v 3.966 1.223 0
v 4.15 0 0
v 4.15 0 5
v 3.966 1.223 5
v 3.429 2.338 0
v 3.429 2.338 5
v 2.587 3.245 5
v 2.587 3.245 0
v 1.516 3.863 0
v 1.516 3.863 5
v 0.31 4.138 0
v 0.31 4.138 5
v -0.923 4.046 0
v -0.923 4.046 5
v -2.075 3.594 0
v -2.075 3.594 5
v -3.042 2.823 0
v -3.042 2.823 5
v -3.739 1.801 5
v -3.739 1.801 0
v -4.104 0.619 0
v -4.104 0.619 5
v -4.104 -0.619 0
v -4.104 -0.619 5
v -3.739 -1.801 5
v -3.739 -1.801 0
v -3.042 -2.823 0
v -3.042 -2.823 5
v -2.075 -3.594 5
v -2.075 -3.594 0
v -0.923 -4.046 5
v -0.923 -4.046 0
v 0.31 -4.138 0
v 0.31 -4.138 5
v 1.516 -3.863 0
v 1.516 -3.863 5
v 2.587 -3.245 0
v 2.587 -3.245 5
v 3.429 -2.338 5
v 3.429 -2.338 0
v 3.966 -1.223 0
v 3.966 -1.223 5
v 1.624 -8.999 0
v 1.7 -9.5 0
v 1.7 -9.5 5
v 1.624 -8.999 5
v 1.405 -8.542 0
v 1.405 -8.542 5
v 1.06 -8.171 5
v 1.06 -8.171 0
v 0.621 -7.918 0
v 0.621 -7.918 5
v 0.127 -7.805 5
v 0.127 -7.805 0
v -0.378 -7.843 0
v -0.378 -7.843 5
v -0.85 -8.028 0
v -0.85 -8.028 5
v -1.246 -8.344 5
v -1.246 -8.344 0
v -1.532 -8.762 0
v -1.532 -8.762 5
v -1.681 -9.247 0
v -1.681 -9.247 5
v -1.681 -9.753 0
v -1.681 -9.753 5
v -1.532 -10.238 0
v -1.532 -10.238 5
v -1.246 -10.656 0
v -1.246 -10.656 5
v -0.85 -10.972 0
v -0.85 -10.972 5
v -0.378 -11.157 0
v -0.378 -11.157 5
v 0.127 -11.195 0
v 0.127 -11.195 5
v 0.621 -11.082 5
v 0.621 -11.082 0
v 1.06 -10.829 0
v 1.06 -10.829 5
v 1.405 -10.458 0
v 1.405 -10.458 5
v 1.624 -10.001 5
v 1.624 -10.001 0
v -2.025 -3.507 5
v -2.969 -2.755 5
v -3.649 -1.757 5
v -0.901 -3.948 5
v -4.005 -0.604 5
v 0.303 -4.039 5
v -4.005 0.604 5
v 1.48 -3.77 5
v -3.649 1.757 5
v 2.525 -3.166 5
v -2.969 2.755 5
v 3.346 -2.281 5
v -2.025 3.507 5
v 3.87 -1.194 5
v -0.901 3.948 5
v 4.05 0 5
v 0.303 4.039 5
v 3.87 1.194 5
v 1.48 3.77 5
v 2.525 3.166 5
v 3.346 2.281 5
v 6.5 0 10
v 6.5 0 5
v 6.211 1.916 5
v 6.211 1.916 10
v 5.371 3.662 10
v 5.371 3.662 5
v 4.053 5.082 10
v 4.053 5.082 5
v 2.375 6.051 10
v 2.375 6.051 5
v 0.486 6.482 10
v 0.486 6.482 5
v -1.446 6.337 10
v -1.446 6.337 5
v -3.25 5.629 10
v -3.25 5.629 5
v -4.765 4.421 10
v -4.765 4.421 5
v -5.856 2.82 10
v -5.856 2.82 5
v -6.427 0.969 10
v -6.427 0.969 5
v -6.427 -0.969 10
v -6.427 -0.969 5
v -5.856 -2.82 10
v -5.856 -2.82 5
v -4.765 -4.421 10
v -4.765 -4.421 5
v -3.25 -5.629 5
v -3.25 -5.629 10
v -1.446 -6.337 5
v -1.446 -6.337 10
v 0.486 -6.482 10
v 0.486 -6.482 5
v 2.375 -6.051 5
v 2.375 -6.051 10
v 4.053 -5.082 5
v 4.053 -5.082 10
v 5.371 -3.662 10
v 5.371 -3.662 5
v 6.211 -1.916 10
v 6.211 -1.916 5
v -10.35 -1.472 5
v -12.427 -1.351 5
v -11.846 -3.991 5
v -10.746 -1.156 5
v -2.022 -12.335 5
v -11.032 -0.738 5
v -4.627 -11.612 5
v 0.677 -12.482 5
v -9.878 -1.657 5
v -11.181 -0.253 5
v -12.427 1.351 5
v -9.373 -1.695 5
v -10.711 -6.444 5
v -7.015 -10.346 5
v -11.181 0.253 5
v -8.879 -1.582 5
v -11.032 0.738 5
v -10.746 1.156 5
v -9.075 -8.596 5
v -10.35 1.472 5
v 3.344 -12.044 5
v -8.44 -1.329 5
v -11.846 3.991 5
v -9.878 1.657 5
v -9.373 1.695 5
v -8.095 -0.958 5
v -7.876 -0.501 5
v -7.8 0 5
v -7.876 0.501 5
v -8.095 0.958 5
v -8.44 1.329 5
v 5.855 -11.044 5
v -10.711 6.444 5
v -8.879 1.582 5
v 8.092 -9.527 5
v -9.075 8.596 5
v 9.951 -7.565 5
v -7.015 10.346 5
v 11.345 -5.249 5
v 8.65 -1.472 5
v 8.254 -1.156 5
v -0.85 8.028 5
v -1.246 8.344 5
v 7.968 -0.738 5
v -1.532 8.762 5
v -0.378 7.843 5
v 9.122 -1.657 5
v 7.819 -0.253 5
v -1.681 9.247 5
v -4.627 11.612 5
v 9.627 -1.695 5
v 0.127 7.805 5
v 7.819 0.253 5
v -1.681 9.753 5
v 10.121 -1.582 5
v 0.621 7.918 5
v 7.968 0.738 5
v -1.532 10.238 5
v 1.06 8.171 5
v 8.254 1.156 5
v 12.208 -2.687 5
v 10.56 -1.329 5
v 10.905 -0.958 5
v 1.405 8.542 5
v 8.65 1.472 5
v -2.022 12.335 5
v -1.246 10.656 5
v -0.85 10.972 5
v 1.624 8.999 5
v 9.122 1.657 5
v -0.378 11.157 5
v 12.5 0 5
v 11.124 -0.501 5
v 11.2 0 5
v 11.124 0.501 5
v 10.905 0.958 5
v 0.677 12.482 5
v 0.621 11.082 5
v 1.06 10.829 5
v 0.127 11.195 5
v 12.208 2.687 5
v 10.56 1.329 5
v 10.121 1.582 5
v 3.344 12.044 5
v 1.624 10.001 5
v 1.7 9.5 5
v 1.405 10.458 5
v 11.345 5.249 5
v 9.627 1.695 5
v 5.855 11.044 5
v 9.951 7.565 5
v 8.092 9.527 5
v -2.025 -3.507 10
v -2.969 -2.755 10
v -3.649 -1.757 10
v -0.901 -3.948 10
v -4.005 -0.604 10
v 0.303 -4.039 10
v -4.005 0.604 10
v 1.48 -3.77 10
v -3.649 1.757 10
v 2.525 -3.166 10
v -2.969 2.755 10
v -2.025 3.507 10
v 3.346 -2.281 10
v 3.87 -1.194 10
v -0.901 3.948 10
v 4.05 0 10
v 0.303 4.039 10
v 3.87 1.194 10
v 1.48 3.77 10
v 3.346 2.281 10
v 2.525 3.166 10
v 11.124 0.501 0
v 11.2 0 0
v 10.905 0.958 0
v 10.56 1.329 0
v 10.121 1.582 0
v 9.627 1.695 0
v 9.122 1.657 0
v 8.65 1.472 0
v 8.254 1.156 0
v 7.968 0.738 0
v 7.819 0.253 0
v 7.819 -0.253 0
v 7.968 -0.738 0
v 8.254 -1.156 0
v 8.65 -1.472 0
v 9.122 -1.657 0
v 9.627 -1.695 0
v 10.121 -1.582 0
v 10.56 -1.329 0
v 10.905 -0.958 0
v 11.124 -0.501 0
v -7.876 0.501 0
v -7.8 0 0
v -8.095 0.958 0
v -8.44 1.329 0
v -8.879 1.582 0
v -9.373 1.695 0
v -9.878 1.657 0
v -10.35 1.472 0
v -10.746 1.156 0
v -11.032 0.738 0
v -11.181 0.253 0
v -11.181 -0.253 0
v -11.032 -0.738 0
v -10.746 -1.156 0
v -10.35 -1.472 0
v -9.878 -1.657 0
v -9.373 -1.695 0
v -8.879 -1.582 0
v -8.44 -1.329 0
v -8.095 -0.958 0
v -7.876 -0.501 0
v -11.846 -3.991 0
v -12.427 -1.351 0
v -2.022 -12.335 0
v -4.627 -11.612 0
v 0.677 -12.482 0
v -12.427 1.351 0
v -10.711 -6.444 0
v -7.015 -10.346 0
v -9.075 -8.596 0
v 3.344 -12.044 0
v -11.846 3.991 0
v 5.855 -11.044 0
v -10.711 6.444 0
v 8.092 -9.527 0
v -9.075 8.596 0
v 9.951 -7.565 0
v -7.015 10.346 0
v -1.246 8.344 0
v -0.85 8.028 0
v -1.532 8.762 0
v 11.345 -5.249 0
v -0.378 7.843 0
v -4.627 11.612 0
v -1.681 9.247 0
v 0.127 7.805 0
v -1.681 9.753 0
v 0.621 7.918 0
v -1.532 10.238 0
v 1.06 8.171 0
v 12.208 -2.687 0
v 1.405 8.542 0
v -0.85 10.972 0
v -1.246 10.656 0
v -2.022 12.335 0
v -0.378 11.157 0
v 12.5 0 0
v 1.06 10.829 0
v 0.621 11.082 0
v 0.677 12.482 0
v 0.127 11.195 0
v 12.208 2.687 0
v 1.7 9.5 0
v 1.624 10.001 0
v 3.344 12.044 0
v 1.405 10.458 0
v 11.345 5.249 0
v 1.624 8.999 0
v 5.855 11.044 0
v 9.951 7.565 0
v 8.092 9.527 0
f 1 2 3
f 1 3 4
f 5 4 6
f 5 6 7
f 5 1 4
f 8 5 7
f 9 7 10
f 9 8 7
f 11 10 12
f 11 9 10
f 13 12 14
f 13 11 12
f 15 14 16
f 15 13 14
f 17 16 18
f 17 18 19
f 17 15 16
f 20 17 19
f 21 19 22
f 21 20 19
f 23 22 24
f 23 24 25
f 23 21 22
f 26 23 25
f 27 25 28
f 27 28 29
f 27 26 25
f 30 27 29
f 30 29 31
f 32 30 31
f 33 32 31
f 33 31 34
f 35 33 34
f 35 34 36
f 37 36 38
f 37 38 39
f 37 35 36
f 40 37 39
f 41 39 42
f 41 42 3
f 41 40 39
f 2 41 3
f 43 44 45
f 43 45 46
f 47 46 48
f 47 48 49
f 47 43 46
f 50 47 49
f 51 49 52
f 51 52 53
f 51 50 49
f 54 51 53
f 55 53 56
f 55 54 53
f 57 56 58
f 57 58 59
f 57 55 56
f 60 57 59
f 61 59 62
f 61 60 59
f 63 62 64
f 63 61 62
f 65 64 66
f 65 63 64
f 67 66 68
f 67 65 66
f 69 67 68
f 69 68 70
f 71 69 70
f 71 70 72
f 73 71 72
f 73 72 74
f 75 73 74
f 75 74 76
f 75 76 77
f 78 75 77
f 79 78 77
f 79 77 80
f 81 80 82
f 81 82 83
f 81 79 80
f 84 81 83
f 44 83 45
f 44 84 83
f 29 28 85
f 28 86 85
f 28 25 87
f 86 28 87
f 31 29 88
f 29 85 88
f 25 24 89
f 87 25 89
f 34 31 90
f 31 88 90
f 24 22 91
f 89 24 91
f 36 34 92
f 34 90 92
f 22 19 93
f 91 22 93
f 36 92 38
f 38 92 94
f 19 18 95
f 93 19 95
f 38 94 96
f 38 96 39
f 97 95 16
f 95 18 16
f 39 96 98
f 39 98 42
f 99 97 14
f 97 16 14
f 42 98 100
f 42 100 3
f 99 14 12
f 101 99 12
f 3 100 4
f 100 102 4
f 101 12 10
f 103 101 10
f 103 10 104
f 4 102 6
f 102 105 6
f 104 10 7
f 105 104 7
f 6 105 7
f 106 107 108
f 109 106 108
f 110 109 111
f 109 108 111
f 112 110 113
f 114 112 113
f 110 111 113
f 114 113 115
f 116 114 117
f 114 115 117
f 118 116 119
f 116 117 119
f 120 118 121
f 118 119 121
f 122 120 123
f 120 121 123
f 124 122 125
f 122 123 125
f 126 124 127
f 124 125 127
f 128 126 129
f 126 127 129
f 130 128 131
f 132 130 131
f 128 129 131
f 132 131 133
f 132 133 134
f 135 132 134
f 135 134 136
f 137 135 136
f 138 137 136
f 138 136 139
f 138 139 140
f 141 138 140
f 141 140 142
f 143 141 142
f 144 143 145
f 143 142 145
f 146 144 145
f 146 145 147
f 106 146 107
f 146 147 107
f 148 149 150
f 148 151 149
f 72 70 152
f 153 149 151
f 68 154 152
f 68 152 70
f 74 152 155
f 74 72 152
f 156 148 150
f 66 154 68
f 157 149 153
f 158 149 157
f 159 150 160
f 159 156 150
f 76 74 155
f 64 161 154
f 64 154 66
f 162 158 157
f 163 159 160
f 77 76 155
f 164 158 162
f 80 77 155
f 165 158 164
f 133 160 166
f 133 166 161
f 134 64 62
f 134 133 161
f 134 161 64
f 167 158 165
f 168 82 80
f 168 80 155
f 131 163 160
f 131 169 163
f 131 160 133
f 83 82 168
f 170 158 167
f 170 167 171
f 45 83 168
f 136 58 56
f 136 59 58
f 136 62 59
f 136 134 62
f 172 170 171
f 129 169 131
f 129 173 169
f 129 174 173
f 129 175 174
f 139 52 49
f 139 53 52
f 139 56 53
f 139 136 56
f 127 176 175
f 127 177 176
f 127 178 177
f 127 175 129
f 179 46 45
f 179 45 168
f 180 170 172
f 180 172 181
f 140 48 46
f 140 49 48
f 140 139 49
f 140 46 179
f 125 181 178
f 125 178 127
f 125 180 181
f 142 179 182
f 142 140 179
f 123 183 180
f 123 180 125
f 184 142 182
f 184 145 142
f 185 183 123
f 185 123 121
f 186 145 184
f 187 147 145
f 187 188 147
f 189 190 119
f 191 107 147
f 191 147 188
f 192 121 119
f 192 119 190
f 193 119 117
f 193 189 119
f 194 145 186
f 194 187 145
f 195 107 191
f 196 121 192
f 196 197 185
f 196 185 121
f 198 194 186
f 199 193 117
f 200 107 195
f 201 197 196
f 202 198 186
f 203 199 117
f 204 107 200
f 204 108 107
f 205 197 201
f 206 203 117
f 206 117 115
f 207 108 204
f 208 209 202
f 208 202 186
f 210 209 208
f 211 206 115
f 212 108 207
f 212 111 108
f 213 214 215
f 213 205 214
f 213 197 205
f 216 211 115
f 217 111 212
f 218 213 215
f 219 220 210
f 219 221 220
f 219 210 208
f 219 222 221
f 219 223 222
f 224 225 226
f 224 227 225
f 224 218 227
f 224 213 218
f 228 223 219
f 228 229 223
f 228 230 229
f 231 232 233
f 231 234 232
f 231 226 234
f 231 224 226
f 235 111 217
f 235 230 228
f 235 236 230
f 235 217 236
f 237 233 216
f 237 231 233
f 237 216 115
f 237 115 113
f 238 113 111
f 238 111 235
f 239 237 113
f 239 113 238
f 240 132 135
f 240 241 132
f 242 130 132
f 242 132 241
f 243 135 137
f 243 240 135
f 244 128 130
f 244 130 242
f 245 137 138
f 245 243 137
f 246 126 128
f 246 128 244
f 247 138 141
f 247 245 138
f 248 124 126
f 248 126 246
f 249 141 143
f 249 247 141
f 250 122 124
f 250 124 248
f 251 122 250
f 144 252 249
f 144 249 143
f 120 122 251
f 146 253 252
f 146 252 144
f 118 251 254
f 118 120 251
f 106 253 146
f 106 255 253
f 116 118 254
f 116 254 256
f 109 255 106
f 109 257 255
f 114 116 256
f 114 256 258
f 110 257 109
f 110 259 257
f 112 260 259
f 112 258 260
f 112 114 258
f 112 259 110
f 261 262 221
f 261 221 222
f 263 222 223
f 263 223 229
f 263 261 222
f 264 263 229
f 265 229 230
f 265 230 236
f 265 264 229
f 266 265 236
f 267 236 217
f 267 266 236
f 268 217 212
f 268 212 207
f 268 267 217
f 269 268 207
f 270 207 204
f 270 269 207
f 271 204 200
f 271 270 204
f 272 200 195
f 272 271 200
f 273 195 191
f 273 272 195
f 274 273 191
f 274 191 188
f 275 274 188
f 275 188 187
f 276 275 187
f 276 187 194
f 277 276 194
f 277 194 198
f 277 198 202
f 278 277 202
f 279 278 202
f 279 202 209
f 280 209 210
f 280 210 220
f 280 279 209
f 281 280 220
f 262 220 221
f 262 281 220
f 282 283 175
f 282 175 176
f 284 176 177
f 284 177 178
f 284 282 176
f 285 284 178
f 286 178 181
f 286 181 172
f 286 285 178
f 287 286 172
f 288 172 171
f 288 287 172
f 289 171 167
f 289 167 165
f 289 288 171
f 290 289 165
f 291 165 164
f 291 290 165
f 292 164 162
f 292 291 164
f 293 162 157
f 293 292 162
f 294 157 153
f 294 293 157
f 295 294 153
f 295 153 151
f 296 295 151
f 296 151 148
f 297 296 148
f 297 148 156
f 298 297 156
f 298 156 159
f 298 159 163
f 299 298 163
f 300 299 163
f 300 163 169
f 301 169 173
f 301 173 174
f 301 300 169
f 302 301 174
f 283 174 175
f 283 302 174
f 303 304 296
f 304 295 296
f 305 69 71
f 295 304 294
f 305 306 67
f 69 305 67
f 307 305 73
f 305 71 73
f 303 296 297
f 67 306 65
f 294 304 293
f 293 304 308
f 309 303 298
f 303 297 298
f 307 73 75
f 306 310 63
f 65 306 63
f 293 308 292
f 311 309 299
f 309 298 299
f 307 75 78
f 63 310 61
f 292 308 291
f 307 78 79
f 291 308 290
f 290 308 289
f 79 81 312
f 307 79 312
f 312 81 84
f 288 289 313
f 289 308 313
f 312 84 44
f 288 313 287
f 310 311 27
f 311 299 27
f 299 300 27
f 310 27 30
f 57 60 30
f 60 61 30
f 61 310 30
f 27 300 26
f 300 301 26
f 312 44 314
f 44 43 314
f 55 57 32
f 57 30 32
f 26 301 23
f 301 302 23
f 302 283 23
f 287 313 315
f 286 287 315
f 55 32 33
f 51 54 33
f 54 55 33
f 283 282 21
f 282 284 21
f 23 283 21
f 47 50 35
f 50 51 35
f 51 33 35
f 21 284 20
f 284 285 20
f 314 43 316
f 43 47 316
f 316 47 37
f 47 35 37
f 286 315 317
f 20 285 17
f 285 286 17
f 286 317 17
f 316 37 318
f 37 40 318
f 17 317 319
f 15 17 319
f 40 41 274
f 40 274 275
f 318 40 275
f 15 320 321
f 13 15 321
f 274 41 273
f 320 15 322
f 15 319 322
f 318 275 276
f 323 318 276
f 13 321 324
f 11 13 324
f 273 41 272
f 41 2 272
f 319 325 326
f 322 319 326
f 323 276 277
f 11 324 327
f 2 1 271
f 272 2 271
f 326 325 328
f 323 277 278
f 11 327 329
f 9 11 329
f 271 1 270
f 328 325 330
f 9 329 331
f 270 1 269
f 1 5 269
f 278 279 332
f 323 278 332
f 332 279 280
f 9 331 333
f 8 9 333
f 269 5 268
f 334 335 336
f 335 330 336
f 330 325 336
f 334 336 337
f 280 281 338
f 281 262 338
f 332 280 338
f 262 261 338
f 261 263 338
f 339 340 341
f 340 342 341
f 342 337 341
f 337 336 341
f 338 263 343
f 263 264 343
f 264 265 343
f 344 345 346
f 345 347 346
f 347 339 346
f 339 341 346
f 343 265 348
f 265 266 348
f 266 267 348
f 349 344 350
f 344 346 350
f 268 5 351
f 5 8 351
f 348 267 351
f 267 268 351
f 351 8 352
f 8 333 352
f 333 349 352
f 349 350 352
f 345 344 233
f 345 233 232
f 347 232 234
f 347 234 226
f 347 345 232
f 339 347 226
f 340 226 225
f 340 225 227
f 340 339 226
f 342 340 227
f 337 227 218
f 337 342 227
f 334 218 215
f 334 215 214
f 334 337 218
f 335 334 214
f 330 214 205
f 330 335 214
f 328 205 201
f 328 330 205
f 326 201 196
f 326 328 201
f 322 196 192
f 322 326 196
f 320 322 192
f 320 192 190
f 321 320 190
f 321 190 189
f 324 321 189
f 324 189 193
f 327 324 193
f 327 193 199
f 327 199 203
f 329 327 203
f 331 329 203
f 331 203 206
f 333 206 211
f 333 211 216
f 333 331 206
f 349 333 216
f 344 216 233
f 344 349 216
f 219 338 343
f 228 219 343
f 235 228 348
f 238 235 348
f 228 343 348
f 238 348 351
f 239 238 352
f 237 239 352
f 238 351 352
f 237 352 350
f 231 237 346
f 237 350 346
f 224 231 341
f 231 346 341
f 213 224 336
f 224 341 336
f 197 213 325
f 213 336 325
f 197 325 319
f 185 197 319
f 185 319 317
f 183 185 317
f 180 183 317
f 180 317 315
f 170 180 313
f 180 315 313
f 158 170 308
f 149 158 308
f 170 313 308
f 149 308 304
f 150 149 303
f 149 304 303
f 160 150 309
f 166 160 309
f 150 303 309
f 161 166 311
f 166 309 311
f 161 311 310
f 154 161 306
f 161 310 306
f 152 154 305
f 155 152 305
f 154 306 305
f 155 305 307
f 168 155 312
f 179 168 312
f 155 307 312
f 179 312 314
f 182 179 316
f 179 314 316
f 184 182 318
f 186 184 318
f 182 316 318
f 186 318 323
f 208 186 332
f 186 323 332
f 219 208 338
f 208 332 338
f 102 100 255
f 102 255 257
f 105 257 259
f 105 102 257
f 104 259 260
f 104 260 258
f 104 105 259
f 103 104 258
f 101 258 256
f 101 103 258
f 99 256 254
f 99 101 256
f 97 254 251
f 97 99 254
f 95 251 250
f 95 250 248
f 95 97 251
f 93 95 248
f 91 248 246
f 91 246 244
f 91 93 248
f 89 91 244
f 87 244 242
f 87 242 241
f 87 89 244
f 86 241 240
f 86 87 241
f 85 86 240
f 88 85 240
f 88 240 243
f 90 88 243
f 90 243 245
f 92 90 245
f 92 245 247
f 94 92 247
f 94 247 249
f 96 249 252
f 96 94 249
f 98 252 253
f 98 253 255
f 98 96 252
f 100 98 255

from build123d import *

# Parameters (mm, degrees)
SKETCH_R      = 12.5
SKETCH_R_2    = 1.7
SKETCH_R_3    = 4.15
PAD_DEPTH     = 5
SKETCH001_R   = 6.5
SKETCH001_R_2 = 4.05
PAD001_DEPTH  = 5


with BuildPart() as part:
    # Sketch → Pad (new body)
    with BuildSketch(Plane.XY):
        Circle(SKETCH_R)
        with Locations((0, 9.5)):
            Circle(SKETCH_R_2, mode=Mode.SUBTRACT)
        with Locations((-9.5, 0)):
            Circle(SKETCH_R_2, mode=Mode.SUBTRACT)
        with Locations((0, -9.5)):
            Circle(SKETCH_R_2, mode=Mode.SUBTRACT)
        with Locations((9.5, 0)):
            Circle(SKETCH_R_2, mode=Mode.SUBTRACT)
        Circle(SKETCH_R_3, mode=Mode.SUBTRACT)
    extrude(amount=PAD_DEPTH)

    # Sketch001 → Pad001 (join)
    with BuildSketch(Plane.XY.offset(5)):
        Circle(SKETCH001_R)
        Circle(SKETCH001_R_2, mode=Mode.SUBTRACT)
    extrude(amount=PAD001_DEPTH)


solid = part.part
